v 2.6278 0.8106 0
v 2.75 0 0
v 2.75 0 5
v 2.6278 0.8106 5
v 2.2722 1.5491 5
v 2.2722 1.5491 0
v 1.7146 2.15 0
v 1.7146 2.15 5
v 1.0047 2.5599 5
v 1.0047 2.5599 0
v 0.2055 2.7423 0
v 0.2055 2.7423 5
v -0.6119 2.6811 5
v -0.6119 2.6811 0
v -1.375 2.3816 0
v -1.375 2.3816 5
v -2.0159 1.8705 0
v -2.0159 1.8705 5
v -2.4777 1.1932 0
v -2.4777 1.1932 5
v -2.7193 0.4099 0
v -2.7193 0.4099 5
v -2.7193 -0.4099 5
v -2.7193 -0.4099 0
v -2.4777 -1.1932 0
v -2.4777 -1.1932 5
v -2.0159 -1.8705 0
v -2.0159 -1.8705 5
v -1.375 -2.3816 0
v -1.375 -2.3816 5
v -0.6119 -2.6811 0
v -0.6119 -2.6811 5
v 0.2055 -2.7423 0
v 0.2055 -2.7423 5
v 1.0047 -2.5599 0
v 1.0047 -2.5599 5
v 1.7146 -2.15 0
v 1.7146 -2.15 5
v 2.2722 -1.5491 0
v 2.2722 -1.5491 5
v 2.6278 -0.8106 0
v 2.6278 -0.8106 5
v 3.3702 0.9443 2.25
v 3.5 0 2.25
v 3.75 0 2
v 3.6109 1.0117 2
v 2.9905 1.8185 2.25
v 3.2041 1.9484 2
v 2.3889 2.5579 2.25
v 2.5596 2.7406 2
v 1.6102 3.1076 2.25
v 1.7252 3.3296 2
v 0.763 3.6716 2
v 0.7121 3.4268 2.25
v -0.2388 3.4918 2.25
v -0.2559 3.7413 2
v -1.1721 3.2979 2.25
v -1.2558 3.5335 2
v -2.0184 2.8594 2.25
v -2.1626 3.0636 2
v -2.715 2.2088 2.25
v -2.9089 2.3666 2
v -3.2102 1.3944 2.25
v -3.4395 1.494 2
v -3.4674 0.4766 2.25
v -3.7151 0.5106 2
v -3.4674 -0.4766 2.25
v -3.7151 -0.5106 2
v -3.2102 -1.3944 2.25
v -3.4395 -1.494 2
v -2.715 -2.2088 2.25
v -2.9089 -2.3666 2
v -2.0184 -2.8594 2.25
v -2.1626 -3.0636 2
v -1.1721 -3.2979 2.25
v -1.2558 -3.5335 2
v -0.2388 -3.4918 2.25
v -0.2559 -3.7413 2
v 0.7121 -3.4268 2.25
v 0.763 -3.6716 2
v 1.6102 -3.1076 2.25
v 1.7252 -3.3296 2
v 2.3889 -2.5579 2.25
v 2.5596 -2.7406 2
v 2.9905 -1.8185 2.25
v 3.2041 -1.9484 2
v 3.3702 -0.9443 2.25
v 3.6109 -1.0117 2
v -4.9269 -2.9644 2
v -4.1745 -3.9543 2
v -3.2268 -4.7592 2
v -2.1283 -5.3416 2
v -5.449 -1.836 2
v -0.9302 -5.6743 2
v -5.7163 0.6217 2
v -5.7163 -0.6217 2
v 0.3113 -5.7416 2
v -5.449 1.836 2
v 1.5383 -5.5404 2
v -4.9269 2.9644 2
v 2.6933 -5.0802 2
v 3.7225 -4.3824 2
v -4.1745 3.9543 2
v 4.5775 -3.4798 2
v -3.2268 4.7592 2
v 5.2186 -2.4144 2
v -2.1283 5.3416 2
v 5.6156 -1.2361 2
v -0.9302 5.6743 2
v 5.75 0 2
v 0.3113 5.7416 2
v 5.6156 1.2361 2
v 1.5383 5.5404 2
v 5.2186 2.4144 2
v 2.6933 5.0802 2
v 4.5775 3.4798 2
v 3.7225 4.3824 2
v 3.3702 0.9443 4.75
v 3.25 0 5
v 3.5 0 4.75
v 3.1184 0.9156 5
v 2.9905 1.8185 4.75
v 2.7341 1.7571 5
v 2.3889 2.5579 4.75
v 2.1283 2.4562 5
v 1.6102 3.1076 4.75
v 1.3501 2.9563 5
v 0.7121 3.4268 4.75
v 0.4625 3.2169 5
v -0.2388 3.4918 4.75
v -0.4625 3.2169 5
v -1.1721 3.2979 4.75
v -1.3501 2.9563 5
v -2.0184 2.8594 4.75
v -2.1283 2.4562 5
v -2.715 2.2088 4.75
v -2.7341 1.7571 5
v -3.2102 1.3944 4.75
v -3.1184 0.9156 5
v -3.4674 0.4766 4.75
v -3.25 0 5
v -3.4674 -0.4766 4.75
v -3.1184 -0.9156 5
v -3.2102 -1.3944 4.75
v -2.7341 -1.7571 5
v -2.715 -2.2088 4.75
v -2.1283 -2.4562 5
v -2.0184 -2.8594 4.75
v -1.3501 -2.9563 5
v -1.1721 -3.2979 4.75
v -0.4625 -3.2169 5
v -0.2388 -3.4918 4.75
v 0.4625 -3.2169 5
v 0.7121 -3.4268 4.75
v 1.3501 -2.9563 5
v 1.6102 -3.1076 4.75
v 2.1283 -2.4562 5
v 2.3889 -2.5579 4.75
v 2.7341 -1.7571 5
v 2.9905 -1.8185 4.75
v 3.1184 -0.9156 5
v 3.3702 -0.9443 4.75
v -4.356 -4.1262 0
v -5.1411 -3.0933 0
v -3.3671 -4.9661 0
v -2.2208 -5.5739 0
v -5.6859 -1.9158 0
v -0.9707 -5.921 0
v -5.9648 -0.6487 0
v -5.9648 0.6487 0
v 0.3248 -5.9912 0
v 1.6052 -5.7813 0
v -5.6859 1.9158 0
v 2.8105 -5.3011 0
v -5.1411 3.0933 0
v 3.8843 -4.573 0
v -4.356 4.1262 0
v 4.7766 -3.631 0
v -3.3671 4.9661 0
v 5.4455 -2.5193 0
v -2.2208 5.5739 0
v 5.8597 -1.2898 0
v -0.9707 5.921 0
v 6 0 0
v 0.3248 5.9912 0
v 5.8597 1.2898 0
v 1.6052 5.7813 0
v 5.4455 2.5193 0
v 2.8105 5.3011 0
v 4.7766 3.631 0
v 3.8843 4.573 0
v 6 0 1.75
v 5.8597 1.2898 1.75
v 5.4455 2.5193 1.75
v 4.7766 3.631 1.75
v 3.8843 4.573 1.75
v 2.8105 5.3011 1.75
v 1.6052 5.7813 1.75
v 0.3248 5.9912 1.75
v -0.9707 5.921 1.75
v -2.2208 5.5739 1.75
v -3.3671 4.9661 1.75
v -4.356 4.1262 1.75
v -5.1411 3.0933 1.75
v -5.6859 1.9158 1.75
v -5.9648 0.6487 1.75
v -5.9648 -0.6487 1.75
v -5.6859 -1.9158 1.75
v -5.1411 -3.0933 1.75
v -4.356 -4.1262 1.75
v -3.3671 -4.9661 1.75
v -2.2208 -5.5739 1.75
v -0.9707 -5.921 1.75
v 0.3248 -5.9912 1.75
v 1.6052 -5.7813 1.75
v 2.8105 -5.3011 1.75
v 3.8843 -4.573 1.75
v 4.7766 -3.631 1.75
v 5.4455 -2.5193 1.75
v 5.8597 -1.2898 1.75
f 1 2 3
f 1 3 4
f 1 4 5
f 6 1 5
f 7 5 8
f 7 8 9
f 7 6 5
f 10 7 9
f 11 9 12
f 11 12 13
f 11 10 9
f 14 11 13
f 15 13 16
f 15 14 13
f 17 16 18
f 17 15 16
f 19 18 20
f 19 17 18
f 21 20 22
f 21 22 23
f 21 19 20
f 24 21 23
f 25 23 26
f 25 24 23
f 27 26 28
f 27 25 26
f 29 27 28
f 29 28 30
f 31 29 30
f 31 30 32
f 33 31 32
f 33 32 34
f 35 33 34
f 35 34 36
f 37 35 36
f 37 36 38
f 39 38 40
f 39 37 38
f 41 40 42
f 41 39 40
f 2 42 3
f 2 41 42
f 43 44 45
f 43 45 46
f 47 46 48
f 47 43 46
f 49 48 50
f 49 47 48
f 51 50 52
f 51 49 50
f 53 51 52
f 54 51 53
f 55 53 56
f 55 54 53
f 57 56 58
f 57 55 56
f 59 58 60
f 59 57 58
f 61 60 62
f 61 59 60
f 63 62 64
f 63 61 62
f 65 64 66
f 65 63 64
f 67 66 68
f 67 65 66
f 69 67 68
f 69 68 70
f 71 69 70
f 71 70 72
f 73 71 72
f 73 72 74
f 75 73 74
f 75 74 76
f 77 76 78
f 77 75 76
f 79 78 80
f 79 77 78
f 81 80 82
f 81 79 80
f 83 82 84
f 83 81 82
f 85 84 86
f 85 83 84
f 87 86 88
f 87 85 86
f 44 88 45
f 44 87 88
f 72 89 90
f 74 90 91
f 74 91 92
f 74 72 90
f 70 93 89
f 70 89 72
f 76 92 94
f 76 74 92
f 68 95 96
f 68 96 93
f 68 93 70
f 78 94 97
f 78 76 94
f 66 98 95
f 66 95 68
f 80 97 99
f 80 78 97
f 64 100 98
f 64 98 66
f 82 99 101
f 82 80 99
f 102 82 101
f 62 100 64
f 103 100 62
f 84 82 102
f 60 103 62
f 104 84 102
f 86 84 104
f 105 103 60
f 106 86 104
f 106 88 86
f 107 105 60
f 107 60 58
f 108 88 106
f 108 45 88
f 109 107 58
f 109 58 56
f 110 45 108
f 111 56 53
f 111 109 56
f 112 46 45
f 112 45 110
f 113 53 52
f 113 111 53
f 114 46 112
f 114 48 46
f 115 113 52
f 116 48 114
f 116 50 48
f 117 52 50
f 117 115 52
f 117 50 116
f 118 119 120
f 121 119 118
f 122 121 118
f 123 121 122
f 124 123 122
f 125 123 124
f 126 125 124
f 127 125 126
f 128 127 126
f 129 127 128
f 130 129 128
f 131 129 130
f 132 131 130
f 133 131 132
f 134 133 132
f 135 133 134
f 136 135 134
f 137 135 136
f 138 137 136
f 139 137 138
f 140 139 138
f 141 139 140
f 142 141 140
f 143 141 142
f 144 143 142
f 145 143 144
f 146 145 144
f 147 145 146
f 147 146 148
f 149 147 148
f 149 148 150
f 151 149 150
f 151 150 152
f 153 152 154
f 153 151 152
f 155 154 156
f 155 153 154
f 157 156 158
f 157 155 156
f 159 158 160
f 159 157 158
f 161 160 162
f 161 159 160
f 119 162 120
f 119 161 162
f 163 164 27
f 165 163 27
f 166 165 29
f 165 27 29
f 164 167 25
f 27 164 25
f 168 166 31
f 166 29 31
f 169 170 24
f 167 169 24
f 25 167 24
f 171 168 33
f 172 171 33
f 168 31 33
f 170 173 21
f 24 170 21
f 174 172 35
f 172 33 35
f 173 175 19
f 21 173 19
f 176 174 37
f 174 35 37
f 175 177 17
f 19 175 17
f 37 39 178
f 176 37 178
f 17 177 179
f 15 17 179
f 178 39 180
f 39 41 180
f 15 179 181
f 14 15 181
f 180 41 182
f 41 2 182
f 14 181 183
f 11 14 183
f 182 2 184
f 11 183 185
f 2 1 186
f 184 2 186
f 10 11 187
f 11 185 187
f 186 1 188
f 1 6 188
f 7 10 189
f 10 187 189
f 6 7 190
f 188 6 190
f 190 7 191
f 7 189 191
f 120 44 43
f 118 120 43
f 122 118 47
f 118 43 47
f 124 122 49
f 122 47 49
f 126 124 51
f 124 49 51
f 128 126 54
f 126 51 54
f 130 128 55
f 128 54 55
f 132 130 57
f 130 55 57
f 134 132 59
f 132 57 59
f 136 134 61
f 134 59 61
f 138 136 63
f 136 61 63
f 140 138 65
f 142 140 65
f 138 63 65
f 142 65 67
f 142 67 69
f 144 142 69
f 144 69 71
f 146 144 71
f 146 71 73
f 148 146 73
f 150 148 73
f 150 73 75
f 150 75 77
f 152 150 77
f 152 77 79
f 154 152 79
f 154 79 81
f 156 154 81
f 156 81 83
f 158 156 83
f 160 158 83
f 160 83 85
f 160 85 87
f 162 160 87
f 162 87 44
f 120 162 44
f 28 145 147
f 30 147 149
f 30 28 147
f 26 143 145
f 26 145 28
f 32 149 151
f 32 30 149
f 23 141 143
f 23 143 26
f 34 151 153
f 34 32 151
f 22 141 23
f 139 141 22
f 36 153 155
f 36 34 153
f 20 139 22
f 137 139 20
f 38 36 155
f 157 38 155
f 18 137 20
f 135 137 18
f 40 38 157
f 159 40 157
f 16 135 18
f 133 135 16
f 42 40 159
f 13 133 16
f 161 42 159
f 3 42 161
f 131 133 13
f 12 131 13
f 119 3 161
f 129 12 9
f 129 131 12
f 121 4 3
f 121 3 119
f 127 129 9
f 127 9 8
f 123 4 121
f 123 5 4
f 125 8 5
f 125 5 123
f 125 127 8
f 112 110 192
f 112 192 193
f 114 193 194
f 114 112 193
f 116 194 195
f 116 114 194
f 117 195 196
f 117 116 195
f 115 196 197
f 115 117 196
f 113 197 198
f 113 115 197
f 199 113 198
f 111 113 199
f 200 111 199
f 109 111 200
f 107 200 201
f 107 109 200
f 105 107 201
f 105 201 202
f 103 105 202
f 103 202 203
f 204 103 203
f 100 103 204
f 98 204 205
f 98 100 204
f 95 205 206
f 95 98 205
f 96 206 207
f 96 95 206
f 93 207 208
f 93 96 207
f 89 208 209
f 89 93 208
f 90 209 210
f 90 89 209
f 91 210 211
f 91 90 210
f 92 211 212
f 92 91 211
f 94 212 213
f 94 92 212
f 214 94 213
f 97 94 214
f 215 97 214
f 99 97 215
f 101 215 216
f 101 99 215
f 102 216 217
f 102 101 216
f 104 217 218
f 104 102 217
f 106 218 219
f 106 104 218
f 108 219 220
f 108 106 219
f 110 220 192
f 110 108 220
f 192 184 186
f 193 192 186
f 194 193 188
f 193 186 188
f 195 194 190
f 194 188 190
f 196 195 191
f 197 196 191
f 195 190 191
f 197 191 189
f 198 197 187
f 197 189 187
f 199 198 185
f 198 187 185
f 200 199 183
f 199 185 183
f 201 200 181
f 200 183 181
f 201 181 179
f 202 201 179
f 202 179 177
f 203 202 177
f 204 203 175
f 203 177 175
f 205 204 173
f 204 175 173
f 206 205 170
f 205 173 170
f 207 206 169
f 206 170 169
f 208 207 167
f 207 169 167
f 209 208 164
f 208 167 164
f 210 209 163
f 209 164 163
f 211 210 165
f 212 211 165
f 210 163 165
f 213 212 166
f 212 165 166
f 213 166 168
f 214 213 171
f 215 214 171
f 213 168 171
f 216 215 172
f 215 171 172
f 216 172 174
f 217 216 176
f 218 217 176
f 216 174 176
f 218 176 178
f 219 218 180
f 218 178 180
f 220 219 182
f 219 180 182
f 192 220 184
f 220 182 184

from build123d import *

# Parameters (mm, degrees)
F1_R     = 3.5
F1_R_2   = 2.75
F2_DEPTH = 5
F1_R_3   = 6
F3_DEPTH = 2
F4_SIZE  = 0.25


with BuildPart() as f2:
    # F1 (on Top) → F2 (new body)
    with BuildSketch(Plane.XY):
        Circle(F1_R)
        Circle(F1_R_2, mode=Mode.SUBTRACT)
    extrude(amount=F2_DEPTH)

    # F1 (on Top) → F3 (join)
    with BuildSketch(Plane.XY):
        Circle(F1_R_3)
        Circle(F1_R, mode=Mode.SUBTRACT)
    extrude(amount=F3_DEPTH)

    # F4
    f4_edges = [f2.edges().sort_by_distance(p)[0] for p in [
        (-3.5, 0, 5),
        (-3.5, 0, 2),
        (-6, 0, 2),
    ]]
    chamfer(f4_edges, length=F4_SIZE)


solid = f2.part
